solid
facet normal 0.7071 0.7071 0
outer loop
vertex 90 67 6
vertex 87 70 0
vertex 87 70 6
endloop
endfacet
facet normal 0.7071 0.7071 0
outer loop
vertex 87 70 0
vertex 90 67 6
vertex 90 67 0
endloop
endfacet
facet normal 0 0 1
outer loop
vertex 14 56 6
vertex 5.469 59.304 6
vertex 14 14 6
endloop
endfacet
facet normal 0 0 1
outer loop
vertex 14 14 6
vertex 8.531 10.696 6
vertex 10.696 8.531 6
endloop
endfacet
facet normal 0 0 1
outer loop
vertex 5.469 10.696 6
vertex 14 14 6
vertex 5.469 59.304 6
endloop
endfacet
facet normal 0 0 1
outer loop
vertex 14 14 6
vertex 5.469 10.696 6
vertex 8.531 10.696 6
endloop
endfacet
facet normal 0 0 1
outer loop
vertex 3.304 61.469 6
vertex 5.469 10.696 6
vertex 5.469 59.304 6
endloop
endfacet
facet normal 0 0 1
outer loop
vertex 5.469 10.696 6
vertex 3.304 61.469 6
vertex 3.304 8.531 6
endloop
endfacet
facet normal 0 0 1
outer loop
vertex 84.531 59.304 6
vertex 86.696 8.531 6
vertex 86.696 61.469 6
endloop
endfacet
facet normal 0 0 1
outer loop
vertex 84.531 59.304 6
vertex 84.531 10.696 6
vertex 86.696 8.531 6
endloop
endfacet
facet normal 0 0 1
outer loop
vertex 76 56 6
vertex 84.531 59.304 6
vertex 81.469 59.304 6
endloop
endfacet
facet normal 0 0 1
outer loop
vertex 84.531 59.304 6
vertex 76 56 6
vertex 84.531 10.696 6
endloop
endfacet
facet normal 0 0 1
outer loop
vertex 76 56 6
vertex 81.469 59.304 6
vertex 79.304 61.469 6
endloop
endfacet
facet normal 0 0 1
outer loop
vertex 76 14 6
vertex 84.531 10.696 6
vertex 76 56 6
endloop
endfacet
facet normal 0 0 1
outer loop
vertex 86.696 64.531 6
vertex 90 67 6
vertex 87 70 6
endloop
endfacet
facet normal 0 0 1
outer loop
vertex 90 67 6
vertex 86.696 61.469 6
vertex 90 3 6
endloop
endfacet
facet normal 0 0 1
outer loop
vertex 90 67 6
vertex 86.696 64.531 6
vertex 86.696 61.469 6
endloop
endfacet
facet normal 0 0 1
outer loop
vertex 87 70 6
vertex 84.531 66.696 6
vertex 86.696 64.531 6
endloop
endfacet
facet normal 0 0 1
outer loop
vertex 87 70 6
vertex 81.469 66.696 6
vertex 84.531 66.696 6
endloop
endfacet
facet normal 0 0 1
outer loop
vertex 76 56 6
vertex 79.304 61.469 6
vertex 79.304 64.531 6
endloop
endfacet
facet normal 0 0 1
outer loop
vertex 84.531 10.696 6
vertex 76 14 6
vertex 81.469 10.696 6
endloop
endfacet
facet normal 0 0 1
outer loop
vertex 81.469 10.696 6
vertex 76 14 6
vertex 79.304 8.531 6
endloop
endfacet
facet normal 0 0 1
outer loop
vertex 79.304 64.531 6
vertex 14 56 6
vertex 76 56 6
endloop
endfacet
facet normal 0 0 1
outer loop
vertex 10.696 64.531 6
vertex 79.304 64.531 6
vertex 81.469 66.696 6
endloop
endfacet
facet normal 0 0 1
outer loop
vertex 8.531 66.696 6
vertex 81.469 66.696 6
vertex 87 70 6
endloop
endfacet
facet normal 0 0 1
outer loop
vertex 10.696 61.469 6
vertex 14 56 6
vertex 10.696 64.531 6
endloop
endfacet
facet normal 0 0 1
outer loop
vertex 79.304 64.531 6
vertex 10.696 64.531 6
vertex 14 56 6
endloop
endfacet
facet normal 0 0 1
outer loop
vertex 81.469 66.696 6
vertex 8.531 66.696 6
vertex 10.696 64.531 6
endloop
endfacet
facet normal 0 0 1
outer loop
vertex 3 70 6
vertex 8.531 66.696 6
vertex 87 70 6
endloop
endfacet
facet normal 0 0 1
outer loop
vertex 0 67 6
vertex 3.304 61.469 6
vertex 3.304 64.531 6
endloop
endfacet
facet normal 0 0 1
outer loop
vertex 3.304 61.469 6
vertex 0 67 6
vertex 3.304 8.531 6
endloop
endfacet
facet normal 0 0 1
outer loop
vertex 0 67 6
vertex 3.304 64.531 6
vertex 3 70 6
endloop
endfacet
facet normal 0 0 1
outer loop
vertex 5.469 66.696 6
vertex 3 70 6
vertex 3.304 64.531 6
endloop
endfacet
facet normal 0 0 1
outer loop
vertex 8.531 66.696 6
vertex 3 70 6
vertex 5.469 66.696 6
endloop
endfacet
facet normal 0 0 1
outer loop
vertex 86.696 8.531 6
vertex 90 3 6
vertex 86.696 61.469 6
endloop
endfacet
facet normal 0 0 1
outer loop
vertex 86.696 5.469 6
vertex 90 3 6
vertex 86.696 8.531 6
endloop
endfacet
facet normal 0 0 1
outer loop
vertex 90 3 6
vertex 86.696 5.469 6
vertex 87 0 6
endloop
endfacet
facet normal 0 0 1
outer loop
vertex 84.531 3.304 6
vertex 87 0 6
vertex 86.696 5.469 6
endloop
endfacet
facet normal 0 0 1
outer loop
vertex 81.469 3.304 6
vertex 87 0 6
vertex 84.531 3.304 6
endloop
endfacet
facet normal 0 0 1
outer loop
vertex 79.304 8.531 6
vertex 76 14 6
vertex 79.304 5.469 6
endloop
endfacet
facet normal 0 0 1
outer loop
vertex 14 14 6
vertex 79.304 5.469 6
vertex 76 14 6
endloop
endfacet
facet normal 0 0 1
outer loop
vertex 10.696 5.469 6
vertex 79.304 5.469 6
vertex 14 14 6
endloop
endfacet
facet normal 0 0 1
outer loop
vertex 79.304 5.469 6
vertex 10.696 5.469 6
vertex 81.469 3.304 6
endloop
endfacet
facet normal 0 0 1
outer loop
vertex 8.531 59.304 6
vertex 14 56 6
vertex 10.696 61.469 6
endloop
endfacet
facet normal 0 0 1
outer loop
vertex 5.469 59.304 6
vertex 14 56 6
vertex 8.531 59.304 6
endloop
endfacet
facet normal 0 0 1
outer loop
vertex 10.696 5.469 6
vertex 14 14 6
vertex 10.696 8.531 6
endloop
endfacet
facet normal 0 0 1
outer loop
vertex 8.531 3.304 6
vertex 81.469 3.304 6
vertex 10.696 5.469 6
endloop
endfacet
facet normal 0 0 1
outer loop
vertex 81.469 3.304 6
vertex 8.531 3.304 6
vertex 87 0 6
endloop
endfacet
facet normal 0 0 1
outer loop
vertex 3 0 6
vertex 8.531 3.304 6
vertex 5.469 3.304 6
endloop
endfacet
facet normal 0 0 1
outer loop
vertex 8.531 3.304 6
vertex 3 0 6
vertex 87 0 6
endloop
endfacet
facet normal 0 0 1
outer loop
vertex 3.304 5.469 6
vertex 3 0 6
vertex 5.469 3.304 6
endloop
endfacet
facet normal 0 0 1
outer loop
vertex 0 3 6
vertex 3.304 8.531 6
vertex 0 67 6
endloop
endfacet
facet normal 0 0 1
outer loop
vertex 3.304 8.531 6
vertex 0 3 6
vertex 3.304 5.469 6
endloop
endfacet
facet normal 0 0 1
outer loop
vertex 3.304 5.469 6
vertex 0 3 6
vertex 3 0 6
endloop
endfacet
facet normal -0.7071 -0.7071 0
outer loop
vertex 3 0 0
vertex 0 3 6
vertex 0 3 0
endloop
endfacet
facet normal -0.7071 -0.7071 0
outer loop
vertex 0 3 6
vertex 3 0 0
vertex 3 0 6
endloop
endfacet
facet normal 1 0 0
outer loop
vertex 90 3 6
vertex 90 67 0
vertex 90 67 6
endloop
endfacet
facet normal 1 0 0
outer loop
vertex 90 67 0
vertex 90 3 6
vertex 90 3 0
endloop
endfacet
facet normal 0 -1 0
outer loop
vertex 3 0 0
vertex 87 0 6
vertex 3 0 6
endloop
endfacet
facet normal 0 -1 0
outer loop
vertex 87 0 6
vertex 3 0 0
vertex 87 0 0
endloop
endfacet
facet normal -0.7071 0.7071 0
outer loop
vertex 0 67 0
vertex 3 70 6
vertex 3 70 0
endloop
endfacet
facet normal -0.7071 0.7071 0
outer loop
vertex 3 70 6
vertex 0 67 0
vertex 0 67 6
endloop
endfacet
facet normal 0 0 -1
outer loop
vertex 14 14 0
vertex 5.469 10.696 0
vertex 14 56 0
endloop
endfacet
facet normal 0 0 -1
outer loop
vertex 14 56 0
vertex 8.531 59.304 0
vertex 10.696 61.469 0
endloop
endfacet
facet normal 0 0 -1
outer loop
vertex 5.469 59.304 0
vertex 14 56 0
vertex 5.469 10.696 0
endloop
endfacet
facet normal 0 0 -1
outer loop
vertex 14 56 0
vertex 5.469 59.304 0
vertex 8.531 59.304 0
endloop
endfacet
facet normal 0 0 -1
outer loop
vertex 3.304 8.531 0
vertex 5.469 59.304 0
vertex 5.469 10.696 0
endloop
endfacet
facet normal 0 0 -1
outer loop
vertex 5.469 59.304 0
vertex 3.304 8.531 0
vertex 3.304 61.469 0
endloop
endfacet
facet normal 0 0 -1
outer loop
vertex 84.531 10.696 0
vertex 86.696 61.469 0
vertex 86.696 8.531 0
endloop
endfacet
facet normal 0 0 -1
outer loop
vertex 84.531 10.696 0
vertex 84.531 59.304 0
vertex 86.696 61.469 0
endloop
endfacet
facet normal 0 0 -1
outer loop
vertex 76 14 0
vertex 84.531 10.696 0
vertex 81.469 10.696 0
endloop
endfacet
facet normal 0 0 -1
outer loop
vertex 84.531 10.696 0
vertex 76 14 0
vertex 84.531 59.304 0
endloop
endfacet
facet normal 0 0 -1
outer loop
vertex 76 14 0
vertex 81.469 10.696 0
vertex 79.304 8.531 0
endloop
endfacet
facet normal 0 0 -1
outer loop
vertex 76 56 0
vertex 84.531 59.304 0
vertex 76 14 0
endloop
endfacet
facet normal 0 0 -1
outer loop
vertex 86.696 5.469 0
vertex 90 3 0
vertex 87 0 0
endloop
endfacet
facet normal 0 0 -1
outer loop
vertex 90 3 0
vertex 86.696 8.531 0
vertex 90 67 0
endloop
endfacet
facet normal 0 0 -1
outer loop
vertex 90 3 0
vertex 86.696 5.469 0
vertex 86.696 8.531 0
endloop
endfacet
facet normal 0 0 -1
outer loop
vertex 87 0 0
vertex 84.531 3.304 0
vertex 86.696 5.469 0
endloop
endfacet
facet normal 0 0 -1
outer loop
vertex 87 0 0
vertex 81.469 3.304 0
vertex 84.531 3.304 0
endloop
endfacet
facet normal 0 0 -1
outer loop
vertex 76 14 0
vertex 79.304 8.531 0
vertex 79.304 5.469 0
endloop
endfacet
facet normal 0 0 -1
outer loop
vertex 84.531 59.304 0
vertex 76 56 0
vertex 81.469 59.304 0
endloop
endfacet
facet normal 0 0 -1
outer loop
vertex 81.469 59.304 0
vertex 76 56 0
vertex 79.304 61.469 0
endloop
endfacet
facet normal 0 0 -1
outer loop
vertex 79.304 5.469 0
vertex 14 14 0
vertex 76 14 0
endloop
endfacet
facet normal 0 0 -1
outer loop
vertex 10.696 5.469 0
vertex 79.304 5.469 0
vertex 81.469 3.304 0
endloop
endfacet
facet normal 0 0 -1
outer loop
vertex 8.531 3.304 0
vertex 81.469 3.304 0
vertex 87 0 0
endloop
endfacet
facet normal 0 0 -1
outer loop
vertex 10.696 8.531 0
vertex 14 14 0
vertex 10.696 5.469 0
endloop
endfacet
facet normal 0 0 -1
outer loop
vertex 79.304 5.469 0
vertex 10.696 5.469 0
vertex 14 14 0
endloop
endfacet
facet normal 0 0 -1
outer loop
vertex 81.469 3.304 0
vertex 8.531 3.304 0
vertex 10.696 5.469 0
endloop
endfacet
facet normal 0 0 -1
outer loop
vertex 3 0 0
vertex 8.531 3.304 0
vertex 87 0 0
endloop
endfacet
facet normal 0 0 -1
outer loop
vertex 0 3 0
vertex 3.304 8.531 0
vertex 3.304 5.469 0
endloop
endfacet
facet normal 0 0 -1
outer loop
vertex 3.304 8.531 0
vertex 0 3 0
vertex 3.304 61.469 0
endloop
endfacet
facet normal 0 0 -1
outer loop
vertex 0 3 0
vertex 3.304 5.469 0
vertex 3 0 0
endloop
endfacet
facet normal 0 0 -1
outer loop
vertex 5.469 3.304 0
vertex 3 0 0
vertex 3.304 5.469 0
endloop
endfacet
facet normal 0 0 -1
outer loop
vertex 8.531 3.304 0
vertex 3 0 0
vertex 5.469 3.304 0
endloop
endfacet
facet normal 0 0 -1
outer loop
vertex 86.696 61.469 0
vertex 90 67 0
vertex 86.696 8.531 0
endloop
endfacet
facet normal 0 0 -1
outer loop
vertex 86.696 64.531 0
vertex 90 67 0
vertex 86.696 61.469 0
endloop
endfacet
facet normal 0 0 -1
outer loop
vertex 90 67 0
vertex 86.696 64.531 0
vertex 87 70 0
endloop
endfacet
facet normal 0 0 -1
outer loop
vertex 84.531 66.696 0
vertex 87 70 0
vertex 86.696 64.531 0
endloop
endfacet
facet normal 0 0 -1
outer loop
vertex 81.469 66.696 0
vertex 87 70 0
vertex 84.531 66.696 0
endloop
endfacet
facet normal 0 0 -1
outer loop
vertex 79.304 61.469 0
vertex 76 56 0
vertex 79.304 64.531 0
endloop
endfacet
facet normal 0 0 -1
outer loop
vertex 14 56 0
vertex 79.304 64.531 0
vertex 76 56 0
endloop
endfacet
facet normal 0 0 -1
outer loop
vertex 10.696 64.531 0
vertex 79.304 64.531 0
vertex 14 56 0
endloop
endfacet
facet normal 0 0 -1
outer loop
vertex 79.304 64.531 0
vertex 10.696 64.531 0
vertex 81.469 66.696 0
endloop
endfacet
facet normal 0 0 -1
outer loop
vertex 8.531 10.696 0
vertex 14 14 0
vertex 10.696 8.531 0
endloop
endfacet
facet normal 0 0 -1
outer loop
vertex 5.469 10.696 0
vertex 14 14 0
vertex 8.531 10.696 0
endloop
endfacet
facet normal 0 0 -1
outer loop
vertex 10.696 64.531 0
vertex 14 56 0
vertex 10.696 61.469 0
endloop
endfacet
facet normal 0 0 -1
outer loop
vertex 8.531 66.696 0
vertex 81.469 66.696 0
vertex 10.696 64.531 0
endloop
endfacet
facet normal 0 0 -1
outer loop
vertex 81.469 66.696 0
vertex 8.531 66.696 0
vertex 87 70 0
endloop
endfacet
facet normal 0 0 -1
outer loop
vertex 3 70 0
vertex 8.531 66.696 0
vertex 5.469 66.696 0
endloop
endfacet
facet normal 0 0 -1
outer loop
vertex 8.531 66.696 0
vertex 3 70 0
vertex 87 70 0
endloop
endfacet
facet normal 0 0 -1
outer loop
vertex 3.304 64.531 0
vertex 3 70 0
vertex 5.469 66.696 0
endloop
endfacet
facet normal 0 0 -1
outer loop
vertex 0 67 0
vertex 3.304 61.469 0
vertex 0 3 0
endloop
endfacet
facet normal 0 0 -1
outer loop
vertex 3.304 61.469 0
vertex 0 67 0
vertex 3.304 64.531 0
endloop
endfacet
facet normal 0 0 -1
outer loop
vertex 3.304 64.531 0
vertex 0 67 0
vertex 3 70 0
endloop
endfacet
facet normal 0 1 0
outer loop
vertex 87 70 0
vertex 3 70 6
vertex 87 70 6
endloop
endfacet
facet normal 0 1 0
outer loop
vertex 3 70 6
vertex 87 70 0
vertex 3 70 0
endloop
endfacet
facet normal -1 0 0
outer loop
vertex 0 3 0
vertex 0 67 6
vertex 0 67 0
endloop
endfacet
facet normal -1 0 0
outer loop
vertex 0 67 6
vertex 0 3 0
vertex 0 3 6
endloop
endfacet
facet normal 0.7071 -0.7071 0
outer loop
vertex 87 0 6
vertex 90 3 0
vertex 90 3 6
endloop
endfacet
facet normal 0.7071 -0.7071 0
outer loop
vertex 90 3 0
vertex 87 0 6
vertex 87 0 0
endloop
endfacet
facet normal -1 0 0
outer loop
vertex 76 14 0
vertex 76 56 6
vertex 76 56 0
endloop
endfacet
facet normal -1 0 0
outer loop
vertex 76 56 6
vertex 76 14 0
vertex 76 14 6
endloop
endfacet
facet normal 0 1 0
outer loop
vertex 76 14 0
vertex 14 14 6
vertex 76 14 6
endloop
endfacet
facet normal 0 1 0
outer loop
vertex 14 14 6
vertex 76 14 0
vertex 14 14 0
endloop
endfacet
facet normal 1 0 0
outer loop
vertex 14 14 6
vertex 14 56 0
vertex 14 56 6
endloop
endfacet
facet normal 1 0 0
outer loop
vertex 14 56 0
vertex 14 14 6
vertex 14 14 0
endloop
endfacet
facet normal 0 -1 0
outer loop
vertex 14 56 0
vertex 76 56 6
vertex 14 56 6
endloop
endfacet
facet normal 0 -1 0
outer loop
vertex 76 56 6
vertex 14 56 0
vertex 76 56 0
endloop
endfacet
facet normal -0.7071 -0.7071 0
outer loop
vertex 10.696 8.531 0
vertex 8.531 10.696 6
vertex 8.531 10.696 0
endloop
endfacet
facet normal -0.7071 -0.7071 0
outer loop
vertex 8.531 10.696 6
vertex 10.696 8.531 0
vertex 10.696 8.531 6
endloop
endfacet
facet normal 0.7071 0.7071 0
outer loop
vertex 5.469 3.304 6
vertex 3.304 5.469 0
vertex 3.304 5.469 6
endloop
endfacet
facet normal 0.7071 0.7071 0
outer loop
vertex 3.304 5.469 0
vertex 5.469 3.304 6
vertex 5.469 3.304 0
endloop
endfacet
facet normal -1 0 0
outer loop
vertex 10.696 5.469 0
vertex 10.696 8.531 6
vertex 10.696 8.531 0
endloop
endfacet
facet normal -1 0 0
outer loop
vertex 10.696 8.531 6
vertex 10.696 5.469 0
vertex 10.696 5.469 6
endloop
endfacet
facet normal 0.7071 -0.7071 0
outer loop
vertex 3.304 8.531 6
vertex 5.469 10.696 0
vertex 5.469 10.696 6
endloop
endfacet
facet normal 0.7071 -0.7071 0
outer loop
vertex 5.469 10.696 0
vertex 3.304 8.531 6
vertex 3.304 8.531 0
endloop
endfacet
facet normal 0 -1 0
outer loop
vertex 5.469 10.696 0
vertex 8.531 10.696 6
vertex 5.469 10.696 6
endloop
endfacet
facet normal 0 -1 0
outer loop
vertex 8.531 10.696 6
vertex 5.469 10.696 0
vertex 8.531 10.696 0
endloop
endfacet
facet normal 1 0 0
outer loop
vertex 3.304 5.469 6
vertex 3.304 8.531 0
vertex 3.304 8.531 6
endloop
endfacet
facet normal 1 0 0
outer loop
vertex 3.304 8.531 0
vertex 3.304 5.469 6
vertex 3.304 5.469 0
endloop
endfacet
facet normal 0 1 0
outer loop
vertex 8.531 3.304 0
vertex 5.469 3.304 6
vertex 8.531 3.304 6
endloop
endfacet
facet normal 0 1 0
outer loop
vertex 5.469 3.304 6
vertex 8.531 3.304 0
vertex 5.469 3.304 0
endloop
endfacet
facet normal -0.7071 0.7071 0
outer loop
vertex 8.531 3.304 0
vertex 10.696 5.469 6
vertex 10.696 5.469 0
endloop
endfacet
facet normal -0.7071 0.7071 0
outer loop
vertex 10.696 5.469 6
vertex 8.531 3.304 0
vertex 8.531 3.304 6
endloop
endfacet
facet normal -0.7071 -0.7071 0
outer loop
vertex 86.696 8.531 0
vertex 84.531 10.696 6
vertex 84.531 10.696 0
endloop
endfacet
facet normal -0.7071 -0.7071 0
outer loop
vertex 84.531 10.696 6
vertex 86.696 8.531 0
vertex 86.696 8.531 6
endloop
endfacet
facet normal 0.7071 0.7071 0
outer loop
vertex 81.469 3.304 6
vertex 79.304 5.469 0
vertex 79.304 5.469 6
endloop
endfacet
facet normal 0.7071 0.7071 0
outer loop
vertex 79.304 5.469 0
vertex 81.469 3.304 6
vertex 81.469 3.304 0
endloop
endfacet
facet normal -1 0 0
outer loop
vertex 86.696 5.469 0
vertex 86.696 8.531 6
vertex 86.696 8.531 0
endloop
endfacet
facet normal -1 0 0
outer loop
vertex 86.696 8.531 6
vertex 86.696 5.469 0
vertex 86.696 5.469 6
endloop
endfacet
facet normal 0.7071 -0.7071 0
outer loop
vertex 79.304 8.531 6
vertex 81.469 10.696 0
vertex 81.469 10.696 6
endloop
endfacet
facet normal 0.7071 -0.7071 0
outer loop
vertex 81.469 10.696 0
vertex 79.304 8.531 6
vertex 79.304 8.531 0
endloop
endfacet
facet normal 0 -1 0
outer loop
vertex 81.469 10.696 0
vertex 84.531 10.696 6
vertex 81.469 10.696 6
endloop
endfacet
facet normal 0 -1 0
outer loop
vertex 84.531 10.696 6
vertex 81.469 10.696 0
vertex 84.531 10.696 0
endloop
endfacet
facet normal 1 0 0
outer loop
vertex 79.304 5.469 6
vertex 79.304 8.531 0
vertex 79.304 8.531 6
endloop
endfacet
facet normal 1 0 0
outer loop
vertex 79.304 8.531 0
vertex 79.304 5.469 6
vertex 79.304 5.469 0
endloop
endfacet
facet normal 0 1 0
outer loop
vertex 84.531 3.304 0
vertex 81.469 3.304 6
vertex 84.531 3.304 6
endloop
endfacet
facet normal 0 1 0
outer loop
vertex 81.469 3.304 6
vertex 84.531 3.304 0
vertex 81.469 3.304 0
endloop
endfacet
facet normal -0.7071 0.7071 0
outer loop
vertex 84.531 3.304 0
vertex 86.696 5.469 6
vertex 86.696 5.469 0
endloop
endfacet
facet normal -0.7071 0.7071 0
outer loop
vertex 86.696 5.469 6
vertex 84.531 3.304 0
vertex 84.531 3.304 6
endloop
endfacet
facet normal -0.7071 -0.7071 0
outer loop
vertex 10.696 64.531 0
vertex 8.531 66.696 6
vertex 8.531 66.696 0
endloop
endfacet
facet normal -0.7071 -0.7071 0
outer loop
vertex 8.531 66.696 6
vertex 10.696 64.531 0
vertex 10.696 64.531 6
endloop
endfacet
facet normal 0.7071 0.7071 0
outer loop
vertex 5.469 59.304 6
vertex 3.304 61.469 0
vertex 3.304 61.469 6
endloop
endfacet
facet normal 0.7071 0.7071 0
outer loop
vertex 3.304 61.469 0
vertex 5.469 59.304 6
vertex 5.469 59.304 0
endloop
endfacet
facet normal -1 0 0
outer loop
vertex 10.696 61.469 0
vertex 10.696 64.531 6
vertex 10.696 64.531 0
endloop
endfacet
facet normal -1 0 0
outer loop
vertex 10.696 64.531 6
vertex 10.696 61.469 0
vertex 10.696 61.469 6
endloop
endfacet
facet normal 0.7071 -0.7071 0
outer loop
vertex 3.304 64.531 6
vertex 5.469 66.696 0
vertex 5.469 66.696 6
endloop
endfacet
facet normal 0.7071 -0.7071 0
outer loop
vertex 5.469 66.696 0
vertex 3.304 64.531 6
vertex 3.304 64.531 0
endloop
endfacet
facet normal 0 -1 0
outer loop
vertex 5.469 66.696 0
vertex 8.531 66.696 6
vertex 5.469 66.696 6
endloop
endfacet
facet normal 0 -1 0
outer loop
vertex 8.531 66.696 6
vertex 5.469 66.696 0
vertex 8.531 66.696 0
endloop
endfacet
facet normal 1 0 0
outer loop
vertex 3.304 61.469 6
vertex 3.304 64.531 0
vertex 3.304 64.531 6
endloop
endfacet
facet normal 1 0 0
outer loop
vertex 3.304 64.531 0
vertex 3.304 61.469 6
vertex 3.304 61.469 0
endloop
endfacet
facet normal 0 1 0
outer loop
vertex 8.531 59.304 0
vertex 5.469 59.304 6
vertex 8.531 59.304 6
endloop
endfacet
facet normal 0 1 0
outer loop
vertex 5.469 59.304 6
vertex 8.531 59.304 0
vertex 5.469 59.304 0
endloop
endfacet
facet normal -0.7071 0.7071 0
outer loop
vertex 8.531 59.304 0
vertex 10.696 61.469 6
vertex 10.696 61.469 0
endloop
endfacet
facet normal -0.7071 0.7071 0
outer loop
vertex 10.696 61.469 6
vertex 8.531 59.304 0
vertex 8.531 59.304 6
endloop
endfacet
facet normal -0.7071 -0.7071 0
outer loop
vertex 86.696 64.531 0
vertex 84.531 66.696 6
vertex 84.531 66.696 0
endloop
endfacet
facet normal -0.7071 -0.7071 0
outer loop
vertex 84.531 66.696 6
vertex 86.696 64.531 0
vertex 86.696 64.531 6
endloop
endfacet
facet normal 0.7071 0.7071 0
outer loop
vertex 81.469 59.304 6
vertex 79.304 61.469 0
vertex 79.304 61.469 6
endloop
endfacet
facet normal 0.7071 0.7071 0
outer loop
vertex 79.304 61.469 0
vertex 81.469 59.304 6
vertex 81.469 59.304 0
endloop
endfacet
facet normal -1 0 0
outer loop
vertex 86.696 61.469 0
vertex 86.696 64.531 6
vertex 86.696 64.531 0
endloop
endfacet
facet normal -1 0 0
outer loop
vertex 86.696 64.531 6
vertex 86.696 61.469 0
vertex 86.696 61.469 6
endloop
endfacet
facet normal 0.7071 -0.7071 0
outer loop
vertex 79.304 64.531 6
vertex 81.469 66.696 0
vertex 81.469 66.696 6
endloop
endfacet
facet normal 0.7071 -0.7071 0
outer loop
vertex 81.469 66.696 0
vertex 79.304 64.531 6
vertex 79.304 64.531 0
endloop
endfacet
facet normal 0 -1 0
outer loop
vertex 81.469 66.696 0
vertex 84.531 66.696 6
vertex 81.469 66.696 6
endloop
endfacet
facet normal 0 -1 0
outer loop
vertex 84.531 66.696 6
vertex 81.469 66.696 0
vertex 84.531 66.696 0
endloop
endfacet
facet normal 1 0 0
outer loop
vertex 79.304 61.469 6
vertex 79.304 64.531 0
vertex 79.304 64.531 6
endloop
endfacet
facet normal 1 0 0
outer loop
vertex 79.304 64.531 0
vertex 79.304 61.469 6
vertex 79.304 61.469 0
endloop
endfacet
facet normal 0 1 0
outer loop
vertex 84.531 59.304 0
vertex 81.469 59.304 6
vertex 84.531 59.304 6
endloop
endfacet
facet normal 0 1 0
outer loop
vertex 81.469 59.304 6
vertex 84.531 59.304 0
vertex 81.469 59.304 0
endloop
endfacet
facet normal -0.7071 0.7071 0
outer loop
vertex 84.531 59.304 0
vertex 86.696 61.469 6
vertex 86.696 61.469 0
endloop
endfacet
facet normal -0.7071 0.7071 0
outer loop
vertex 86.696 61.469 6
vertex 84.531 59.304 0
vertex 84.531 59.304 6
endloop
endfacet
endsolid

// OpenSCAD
$fn = 32;

// ----------------------------------------------------------------------
// Frame plate: 90 x 70 frame, 14 mm rails
// ----------------------------------------------------------------------

// --- parameters (mm) ---
plate_l = 90;             // plate length, X
plate_w = 70;             // plate width, Y
plate_t = 6;              // plate thickness, Z (extrusion height)
corner_c = 3;             // corner chamfer
frame_bar = 14;           // frame rail width
bolt_r = 4;               // corner bolt window radius
bolt_inset = 7;           // bolt centre inset from the edges

win_l = plate_l - 2 * frame_bar;  // window length
win_w = plate_w - 2 * frame_bar;  // window width
bolt_d = 2 * bolt_r;  // corner hole diameter

profile = [[3, 0], [87, 0], [90, 3], [90, 67], [87, 70], [3, 70], [0, 67], [0, 3]];  // primary outline, 8 points, counter clockwise
void_1 = [[14, 14], [76, 14], [76, 56], [14, 56]];  // the window, 4 points
void_2 = [[10.696, 8.531], [8.531, 10.696], [5.469, 10.696], [3.304, 8.531], [3.304, 5.469], [5.469, 3.304], [8.531, 3.304], [10.696, 5.469]];  // corner bolt window, 8 points
void_3 = [[86.696, 8.531], [84.531, 10.696], [81.469, 10.696], [79.304, 8.531], [79.304, 5.469], [81.469, 3.304], [84.531, 3.304], [86.696, 5.469]];  // corner bolt window, 8 points
void_4 = [[10.696, 64.531], [8.531, 66.696], [5.469, 66.696], [3.304, 64.531], [3.304, 61.469], [5.469, 59.304], [8.531, 59.304], [10.696, 61.469]];  // corner bolt window, 8 points
void_5 = [[86.696, 64.531], [84.531, 66.696], [81.469, 66.696], [79.304, 64.531], [79.304, 61.469], [81.469, 59.304], [84.531, 59.304], [86.696, 61.469]];  // corner bolt window, 8 points

// --- the one profile operation ---
difference() {
  linear_extrude(height = plate_t) polygon(points = profile);
  translate([0, 0, -1])
    linear_extrude(height = plate_t + 2) polygon(points = void_1);
  translate([0, 0, -1])
    linear_extrude(height = plate_t + 2) polygon(points = void_2);
  translate([0, 0, -1])
    linear_extrude(height = plate_t + 2) polygon(points = void_3);
  translate([0, 0, -1])
    linear_extrude(height = plate_t + 2) polygon(points = void_4);
  translate([0, 0, -1])
    linear_extrude(height = plate_t + 2) polygon(points = void_5);
}
